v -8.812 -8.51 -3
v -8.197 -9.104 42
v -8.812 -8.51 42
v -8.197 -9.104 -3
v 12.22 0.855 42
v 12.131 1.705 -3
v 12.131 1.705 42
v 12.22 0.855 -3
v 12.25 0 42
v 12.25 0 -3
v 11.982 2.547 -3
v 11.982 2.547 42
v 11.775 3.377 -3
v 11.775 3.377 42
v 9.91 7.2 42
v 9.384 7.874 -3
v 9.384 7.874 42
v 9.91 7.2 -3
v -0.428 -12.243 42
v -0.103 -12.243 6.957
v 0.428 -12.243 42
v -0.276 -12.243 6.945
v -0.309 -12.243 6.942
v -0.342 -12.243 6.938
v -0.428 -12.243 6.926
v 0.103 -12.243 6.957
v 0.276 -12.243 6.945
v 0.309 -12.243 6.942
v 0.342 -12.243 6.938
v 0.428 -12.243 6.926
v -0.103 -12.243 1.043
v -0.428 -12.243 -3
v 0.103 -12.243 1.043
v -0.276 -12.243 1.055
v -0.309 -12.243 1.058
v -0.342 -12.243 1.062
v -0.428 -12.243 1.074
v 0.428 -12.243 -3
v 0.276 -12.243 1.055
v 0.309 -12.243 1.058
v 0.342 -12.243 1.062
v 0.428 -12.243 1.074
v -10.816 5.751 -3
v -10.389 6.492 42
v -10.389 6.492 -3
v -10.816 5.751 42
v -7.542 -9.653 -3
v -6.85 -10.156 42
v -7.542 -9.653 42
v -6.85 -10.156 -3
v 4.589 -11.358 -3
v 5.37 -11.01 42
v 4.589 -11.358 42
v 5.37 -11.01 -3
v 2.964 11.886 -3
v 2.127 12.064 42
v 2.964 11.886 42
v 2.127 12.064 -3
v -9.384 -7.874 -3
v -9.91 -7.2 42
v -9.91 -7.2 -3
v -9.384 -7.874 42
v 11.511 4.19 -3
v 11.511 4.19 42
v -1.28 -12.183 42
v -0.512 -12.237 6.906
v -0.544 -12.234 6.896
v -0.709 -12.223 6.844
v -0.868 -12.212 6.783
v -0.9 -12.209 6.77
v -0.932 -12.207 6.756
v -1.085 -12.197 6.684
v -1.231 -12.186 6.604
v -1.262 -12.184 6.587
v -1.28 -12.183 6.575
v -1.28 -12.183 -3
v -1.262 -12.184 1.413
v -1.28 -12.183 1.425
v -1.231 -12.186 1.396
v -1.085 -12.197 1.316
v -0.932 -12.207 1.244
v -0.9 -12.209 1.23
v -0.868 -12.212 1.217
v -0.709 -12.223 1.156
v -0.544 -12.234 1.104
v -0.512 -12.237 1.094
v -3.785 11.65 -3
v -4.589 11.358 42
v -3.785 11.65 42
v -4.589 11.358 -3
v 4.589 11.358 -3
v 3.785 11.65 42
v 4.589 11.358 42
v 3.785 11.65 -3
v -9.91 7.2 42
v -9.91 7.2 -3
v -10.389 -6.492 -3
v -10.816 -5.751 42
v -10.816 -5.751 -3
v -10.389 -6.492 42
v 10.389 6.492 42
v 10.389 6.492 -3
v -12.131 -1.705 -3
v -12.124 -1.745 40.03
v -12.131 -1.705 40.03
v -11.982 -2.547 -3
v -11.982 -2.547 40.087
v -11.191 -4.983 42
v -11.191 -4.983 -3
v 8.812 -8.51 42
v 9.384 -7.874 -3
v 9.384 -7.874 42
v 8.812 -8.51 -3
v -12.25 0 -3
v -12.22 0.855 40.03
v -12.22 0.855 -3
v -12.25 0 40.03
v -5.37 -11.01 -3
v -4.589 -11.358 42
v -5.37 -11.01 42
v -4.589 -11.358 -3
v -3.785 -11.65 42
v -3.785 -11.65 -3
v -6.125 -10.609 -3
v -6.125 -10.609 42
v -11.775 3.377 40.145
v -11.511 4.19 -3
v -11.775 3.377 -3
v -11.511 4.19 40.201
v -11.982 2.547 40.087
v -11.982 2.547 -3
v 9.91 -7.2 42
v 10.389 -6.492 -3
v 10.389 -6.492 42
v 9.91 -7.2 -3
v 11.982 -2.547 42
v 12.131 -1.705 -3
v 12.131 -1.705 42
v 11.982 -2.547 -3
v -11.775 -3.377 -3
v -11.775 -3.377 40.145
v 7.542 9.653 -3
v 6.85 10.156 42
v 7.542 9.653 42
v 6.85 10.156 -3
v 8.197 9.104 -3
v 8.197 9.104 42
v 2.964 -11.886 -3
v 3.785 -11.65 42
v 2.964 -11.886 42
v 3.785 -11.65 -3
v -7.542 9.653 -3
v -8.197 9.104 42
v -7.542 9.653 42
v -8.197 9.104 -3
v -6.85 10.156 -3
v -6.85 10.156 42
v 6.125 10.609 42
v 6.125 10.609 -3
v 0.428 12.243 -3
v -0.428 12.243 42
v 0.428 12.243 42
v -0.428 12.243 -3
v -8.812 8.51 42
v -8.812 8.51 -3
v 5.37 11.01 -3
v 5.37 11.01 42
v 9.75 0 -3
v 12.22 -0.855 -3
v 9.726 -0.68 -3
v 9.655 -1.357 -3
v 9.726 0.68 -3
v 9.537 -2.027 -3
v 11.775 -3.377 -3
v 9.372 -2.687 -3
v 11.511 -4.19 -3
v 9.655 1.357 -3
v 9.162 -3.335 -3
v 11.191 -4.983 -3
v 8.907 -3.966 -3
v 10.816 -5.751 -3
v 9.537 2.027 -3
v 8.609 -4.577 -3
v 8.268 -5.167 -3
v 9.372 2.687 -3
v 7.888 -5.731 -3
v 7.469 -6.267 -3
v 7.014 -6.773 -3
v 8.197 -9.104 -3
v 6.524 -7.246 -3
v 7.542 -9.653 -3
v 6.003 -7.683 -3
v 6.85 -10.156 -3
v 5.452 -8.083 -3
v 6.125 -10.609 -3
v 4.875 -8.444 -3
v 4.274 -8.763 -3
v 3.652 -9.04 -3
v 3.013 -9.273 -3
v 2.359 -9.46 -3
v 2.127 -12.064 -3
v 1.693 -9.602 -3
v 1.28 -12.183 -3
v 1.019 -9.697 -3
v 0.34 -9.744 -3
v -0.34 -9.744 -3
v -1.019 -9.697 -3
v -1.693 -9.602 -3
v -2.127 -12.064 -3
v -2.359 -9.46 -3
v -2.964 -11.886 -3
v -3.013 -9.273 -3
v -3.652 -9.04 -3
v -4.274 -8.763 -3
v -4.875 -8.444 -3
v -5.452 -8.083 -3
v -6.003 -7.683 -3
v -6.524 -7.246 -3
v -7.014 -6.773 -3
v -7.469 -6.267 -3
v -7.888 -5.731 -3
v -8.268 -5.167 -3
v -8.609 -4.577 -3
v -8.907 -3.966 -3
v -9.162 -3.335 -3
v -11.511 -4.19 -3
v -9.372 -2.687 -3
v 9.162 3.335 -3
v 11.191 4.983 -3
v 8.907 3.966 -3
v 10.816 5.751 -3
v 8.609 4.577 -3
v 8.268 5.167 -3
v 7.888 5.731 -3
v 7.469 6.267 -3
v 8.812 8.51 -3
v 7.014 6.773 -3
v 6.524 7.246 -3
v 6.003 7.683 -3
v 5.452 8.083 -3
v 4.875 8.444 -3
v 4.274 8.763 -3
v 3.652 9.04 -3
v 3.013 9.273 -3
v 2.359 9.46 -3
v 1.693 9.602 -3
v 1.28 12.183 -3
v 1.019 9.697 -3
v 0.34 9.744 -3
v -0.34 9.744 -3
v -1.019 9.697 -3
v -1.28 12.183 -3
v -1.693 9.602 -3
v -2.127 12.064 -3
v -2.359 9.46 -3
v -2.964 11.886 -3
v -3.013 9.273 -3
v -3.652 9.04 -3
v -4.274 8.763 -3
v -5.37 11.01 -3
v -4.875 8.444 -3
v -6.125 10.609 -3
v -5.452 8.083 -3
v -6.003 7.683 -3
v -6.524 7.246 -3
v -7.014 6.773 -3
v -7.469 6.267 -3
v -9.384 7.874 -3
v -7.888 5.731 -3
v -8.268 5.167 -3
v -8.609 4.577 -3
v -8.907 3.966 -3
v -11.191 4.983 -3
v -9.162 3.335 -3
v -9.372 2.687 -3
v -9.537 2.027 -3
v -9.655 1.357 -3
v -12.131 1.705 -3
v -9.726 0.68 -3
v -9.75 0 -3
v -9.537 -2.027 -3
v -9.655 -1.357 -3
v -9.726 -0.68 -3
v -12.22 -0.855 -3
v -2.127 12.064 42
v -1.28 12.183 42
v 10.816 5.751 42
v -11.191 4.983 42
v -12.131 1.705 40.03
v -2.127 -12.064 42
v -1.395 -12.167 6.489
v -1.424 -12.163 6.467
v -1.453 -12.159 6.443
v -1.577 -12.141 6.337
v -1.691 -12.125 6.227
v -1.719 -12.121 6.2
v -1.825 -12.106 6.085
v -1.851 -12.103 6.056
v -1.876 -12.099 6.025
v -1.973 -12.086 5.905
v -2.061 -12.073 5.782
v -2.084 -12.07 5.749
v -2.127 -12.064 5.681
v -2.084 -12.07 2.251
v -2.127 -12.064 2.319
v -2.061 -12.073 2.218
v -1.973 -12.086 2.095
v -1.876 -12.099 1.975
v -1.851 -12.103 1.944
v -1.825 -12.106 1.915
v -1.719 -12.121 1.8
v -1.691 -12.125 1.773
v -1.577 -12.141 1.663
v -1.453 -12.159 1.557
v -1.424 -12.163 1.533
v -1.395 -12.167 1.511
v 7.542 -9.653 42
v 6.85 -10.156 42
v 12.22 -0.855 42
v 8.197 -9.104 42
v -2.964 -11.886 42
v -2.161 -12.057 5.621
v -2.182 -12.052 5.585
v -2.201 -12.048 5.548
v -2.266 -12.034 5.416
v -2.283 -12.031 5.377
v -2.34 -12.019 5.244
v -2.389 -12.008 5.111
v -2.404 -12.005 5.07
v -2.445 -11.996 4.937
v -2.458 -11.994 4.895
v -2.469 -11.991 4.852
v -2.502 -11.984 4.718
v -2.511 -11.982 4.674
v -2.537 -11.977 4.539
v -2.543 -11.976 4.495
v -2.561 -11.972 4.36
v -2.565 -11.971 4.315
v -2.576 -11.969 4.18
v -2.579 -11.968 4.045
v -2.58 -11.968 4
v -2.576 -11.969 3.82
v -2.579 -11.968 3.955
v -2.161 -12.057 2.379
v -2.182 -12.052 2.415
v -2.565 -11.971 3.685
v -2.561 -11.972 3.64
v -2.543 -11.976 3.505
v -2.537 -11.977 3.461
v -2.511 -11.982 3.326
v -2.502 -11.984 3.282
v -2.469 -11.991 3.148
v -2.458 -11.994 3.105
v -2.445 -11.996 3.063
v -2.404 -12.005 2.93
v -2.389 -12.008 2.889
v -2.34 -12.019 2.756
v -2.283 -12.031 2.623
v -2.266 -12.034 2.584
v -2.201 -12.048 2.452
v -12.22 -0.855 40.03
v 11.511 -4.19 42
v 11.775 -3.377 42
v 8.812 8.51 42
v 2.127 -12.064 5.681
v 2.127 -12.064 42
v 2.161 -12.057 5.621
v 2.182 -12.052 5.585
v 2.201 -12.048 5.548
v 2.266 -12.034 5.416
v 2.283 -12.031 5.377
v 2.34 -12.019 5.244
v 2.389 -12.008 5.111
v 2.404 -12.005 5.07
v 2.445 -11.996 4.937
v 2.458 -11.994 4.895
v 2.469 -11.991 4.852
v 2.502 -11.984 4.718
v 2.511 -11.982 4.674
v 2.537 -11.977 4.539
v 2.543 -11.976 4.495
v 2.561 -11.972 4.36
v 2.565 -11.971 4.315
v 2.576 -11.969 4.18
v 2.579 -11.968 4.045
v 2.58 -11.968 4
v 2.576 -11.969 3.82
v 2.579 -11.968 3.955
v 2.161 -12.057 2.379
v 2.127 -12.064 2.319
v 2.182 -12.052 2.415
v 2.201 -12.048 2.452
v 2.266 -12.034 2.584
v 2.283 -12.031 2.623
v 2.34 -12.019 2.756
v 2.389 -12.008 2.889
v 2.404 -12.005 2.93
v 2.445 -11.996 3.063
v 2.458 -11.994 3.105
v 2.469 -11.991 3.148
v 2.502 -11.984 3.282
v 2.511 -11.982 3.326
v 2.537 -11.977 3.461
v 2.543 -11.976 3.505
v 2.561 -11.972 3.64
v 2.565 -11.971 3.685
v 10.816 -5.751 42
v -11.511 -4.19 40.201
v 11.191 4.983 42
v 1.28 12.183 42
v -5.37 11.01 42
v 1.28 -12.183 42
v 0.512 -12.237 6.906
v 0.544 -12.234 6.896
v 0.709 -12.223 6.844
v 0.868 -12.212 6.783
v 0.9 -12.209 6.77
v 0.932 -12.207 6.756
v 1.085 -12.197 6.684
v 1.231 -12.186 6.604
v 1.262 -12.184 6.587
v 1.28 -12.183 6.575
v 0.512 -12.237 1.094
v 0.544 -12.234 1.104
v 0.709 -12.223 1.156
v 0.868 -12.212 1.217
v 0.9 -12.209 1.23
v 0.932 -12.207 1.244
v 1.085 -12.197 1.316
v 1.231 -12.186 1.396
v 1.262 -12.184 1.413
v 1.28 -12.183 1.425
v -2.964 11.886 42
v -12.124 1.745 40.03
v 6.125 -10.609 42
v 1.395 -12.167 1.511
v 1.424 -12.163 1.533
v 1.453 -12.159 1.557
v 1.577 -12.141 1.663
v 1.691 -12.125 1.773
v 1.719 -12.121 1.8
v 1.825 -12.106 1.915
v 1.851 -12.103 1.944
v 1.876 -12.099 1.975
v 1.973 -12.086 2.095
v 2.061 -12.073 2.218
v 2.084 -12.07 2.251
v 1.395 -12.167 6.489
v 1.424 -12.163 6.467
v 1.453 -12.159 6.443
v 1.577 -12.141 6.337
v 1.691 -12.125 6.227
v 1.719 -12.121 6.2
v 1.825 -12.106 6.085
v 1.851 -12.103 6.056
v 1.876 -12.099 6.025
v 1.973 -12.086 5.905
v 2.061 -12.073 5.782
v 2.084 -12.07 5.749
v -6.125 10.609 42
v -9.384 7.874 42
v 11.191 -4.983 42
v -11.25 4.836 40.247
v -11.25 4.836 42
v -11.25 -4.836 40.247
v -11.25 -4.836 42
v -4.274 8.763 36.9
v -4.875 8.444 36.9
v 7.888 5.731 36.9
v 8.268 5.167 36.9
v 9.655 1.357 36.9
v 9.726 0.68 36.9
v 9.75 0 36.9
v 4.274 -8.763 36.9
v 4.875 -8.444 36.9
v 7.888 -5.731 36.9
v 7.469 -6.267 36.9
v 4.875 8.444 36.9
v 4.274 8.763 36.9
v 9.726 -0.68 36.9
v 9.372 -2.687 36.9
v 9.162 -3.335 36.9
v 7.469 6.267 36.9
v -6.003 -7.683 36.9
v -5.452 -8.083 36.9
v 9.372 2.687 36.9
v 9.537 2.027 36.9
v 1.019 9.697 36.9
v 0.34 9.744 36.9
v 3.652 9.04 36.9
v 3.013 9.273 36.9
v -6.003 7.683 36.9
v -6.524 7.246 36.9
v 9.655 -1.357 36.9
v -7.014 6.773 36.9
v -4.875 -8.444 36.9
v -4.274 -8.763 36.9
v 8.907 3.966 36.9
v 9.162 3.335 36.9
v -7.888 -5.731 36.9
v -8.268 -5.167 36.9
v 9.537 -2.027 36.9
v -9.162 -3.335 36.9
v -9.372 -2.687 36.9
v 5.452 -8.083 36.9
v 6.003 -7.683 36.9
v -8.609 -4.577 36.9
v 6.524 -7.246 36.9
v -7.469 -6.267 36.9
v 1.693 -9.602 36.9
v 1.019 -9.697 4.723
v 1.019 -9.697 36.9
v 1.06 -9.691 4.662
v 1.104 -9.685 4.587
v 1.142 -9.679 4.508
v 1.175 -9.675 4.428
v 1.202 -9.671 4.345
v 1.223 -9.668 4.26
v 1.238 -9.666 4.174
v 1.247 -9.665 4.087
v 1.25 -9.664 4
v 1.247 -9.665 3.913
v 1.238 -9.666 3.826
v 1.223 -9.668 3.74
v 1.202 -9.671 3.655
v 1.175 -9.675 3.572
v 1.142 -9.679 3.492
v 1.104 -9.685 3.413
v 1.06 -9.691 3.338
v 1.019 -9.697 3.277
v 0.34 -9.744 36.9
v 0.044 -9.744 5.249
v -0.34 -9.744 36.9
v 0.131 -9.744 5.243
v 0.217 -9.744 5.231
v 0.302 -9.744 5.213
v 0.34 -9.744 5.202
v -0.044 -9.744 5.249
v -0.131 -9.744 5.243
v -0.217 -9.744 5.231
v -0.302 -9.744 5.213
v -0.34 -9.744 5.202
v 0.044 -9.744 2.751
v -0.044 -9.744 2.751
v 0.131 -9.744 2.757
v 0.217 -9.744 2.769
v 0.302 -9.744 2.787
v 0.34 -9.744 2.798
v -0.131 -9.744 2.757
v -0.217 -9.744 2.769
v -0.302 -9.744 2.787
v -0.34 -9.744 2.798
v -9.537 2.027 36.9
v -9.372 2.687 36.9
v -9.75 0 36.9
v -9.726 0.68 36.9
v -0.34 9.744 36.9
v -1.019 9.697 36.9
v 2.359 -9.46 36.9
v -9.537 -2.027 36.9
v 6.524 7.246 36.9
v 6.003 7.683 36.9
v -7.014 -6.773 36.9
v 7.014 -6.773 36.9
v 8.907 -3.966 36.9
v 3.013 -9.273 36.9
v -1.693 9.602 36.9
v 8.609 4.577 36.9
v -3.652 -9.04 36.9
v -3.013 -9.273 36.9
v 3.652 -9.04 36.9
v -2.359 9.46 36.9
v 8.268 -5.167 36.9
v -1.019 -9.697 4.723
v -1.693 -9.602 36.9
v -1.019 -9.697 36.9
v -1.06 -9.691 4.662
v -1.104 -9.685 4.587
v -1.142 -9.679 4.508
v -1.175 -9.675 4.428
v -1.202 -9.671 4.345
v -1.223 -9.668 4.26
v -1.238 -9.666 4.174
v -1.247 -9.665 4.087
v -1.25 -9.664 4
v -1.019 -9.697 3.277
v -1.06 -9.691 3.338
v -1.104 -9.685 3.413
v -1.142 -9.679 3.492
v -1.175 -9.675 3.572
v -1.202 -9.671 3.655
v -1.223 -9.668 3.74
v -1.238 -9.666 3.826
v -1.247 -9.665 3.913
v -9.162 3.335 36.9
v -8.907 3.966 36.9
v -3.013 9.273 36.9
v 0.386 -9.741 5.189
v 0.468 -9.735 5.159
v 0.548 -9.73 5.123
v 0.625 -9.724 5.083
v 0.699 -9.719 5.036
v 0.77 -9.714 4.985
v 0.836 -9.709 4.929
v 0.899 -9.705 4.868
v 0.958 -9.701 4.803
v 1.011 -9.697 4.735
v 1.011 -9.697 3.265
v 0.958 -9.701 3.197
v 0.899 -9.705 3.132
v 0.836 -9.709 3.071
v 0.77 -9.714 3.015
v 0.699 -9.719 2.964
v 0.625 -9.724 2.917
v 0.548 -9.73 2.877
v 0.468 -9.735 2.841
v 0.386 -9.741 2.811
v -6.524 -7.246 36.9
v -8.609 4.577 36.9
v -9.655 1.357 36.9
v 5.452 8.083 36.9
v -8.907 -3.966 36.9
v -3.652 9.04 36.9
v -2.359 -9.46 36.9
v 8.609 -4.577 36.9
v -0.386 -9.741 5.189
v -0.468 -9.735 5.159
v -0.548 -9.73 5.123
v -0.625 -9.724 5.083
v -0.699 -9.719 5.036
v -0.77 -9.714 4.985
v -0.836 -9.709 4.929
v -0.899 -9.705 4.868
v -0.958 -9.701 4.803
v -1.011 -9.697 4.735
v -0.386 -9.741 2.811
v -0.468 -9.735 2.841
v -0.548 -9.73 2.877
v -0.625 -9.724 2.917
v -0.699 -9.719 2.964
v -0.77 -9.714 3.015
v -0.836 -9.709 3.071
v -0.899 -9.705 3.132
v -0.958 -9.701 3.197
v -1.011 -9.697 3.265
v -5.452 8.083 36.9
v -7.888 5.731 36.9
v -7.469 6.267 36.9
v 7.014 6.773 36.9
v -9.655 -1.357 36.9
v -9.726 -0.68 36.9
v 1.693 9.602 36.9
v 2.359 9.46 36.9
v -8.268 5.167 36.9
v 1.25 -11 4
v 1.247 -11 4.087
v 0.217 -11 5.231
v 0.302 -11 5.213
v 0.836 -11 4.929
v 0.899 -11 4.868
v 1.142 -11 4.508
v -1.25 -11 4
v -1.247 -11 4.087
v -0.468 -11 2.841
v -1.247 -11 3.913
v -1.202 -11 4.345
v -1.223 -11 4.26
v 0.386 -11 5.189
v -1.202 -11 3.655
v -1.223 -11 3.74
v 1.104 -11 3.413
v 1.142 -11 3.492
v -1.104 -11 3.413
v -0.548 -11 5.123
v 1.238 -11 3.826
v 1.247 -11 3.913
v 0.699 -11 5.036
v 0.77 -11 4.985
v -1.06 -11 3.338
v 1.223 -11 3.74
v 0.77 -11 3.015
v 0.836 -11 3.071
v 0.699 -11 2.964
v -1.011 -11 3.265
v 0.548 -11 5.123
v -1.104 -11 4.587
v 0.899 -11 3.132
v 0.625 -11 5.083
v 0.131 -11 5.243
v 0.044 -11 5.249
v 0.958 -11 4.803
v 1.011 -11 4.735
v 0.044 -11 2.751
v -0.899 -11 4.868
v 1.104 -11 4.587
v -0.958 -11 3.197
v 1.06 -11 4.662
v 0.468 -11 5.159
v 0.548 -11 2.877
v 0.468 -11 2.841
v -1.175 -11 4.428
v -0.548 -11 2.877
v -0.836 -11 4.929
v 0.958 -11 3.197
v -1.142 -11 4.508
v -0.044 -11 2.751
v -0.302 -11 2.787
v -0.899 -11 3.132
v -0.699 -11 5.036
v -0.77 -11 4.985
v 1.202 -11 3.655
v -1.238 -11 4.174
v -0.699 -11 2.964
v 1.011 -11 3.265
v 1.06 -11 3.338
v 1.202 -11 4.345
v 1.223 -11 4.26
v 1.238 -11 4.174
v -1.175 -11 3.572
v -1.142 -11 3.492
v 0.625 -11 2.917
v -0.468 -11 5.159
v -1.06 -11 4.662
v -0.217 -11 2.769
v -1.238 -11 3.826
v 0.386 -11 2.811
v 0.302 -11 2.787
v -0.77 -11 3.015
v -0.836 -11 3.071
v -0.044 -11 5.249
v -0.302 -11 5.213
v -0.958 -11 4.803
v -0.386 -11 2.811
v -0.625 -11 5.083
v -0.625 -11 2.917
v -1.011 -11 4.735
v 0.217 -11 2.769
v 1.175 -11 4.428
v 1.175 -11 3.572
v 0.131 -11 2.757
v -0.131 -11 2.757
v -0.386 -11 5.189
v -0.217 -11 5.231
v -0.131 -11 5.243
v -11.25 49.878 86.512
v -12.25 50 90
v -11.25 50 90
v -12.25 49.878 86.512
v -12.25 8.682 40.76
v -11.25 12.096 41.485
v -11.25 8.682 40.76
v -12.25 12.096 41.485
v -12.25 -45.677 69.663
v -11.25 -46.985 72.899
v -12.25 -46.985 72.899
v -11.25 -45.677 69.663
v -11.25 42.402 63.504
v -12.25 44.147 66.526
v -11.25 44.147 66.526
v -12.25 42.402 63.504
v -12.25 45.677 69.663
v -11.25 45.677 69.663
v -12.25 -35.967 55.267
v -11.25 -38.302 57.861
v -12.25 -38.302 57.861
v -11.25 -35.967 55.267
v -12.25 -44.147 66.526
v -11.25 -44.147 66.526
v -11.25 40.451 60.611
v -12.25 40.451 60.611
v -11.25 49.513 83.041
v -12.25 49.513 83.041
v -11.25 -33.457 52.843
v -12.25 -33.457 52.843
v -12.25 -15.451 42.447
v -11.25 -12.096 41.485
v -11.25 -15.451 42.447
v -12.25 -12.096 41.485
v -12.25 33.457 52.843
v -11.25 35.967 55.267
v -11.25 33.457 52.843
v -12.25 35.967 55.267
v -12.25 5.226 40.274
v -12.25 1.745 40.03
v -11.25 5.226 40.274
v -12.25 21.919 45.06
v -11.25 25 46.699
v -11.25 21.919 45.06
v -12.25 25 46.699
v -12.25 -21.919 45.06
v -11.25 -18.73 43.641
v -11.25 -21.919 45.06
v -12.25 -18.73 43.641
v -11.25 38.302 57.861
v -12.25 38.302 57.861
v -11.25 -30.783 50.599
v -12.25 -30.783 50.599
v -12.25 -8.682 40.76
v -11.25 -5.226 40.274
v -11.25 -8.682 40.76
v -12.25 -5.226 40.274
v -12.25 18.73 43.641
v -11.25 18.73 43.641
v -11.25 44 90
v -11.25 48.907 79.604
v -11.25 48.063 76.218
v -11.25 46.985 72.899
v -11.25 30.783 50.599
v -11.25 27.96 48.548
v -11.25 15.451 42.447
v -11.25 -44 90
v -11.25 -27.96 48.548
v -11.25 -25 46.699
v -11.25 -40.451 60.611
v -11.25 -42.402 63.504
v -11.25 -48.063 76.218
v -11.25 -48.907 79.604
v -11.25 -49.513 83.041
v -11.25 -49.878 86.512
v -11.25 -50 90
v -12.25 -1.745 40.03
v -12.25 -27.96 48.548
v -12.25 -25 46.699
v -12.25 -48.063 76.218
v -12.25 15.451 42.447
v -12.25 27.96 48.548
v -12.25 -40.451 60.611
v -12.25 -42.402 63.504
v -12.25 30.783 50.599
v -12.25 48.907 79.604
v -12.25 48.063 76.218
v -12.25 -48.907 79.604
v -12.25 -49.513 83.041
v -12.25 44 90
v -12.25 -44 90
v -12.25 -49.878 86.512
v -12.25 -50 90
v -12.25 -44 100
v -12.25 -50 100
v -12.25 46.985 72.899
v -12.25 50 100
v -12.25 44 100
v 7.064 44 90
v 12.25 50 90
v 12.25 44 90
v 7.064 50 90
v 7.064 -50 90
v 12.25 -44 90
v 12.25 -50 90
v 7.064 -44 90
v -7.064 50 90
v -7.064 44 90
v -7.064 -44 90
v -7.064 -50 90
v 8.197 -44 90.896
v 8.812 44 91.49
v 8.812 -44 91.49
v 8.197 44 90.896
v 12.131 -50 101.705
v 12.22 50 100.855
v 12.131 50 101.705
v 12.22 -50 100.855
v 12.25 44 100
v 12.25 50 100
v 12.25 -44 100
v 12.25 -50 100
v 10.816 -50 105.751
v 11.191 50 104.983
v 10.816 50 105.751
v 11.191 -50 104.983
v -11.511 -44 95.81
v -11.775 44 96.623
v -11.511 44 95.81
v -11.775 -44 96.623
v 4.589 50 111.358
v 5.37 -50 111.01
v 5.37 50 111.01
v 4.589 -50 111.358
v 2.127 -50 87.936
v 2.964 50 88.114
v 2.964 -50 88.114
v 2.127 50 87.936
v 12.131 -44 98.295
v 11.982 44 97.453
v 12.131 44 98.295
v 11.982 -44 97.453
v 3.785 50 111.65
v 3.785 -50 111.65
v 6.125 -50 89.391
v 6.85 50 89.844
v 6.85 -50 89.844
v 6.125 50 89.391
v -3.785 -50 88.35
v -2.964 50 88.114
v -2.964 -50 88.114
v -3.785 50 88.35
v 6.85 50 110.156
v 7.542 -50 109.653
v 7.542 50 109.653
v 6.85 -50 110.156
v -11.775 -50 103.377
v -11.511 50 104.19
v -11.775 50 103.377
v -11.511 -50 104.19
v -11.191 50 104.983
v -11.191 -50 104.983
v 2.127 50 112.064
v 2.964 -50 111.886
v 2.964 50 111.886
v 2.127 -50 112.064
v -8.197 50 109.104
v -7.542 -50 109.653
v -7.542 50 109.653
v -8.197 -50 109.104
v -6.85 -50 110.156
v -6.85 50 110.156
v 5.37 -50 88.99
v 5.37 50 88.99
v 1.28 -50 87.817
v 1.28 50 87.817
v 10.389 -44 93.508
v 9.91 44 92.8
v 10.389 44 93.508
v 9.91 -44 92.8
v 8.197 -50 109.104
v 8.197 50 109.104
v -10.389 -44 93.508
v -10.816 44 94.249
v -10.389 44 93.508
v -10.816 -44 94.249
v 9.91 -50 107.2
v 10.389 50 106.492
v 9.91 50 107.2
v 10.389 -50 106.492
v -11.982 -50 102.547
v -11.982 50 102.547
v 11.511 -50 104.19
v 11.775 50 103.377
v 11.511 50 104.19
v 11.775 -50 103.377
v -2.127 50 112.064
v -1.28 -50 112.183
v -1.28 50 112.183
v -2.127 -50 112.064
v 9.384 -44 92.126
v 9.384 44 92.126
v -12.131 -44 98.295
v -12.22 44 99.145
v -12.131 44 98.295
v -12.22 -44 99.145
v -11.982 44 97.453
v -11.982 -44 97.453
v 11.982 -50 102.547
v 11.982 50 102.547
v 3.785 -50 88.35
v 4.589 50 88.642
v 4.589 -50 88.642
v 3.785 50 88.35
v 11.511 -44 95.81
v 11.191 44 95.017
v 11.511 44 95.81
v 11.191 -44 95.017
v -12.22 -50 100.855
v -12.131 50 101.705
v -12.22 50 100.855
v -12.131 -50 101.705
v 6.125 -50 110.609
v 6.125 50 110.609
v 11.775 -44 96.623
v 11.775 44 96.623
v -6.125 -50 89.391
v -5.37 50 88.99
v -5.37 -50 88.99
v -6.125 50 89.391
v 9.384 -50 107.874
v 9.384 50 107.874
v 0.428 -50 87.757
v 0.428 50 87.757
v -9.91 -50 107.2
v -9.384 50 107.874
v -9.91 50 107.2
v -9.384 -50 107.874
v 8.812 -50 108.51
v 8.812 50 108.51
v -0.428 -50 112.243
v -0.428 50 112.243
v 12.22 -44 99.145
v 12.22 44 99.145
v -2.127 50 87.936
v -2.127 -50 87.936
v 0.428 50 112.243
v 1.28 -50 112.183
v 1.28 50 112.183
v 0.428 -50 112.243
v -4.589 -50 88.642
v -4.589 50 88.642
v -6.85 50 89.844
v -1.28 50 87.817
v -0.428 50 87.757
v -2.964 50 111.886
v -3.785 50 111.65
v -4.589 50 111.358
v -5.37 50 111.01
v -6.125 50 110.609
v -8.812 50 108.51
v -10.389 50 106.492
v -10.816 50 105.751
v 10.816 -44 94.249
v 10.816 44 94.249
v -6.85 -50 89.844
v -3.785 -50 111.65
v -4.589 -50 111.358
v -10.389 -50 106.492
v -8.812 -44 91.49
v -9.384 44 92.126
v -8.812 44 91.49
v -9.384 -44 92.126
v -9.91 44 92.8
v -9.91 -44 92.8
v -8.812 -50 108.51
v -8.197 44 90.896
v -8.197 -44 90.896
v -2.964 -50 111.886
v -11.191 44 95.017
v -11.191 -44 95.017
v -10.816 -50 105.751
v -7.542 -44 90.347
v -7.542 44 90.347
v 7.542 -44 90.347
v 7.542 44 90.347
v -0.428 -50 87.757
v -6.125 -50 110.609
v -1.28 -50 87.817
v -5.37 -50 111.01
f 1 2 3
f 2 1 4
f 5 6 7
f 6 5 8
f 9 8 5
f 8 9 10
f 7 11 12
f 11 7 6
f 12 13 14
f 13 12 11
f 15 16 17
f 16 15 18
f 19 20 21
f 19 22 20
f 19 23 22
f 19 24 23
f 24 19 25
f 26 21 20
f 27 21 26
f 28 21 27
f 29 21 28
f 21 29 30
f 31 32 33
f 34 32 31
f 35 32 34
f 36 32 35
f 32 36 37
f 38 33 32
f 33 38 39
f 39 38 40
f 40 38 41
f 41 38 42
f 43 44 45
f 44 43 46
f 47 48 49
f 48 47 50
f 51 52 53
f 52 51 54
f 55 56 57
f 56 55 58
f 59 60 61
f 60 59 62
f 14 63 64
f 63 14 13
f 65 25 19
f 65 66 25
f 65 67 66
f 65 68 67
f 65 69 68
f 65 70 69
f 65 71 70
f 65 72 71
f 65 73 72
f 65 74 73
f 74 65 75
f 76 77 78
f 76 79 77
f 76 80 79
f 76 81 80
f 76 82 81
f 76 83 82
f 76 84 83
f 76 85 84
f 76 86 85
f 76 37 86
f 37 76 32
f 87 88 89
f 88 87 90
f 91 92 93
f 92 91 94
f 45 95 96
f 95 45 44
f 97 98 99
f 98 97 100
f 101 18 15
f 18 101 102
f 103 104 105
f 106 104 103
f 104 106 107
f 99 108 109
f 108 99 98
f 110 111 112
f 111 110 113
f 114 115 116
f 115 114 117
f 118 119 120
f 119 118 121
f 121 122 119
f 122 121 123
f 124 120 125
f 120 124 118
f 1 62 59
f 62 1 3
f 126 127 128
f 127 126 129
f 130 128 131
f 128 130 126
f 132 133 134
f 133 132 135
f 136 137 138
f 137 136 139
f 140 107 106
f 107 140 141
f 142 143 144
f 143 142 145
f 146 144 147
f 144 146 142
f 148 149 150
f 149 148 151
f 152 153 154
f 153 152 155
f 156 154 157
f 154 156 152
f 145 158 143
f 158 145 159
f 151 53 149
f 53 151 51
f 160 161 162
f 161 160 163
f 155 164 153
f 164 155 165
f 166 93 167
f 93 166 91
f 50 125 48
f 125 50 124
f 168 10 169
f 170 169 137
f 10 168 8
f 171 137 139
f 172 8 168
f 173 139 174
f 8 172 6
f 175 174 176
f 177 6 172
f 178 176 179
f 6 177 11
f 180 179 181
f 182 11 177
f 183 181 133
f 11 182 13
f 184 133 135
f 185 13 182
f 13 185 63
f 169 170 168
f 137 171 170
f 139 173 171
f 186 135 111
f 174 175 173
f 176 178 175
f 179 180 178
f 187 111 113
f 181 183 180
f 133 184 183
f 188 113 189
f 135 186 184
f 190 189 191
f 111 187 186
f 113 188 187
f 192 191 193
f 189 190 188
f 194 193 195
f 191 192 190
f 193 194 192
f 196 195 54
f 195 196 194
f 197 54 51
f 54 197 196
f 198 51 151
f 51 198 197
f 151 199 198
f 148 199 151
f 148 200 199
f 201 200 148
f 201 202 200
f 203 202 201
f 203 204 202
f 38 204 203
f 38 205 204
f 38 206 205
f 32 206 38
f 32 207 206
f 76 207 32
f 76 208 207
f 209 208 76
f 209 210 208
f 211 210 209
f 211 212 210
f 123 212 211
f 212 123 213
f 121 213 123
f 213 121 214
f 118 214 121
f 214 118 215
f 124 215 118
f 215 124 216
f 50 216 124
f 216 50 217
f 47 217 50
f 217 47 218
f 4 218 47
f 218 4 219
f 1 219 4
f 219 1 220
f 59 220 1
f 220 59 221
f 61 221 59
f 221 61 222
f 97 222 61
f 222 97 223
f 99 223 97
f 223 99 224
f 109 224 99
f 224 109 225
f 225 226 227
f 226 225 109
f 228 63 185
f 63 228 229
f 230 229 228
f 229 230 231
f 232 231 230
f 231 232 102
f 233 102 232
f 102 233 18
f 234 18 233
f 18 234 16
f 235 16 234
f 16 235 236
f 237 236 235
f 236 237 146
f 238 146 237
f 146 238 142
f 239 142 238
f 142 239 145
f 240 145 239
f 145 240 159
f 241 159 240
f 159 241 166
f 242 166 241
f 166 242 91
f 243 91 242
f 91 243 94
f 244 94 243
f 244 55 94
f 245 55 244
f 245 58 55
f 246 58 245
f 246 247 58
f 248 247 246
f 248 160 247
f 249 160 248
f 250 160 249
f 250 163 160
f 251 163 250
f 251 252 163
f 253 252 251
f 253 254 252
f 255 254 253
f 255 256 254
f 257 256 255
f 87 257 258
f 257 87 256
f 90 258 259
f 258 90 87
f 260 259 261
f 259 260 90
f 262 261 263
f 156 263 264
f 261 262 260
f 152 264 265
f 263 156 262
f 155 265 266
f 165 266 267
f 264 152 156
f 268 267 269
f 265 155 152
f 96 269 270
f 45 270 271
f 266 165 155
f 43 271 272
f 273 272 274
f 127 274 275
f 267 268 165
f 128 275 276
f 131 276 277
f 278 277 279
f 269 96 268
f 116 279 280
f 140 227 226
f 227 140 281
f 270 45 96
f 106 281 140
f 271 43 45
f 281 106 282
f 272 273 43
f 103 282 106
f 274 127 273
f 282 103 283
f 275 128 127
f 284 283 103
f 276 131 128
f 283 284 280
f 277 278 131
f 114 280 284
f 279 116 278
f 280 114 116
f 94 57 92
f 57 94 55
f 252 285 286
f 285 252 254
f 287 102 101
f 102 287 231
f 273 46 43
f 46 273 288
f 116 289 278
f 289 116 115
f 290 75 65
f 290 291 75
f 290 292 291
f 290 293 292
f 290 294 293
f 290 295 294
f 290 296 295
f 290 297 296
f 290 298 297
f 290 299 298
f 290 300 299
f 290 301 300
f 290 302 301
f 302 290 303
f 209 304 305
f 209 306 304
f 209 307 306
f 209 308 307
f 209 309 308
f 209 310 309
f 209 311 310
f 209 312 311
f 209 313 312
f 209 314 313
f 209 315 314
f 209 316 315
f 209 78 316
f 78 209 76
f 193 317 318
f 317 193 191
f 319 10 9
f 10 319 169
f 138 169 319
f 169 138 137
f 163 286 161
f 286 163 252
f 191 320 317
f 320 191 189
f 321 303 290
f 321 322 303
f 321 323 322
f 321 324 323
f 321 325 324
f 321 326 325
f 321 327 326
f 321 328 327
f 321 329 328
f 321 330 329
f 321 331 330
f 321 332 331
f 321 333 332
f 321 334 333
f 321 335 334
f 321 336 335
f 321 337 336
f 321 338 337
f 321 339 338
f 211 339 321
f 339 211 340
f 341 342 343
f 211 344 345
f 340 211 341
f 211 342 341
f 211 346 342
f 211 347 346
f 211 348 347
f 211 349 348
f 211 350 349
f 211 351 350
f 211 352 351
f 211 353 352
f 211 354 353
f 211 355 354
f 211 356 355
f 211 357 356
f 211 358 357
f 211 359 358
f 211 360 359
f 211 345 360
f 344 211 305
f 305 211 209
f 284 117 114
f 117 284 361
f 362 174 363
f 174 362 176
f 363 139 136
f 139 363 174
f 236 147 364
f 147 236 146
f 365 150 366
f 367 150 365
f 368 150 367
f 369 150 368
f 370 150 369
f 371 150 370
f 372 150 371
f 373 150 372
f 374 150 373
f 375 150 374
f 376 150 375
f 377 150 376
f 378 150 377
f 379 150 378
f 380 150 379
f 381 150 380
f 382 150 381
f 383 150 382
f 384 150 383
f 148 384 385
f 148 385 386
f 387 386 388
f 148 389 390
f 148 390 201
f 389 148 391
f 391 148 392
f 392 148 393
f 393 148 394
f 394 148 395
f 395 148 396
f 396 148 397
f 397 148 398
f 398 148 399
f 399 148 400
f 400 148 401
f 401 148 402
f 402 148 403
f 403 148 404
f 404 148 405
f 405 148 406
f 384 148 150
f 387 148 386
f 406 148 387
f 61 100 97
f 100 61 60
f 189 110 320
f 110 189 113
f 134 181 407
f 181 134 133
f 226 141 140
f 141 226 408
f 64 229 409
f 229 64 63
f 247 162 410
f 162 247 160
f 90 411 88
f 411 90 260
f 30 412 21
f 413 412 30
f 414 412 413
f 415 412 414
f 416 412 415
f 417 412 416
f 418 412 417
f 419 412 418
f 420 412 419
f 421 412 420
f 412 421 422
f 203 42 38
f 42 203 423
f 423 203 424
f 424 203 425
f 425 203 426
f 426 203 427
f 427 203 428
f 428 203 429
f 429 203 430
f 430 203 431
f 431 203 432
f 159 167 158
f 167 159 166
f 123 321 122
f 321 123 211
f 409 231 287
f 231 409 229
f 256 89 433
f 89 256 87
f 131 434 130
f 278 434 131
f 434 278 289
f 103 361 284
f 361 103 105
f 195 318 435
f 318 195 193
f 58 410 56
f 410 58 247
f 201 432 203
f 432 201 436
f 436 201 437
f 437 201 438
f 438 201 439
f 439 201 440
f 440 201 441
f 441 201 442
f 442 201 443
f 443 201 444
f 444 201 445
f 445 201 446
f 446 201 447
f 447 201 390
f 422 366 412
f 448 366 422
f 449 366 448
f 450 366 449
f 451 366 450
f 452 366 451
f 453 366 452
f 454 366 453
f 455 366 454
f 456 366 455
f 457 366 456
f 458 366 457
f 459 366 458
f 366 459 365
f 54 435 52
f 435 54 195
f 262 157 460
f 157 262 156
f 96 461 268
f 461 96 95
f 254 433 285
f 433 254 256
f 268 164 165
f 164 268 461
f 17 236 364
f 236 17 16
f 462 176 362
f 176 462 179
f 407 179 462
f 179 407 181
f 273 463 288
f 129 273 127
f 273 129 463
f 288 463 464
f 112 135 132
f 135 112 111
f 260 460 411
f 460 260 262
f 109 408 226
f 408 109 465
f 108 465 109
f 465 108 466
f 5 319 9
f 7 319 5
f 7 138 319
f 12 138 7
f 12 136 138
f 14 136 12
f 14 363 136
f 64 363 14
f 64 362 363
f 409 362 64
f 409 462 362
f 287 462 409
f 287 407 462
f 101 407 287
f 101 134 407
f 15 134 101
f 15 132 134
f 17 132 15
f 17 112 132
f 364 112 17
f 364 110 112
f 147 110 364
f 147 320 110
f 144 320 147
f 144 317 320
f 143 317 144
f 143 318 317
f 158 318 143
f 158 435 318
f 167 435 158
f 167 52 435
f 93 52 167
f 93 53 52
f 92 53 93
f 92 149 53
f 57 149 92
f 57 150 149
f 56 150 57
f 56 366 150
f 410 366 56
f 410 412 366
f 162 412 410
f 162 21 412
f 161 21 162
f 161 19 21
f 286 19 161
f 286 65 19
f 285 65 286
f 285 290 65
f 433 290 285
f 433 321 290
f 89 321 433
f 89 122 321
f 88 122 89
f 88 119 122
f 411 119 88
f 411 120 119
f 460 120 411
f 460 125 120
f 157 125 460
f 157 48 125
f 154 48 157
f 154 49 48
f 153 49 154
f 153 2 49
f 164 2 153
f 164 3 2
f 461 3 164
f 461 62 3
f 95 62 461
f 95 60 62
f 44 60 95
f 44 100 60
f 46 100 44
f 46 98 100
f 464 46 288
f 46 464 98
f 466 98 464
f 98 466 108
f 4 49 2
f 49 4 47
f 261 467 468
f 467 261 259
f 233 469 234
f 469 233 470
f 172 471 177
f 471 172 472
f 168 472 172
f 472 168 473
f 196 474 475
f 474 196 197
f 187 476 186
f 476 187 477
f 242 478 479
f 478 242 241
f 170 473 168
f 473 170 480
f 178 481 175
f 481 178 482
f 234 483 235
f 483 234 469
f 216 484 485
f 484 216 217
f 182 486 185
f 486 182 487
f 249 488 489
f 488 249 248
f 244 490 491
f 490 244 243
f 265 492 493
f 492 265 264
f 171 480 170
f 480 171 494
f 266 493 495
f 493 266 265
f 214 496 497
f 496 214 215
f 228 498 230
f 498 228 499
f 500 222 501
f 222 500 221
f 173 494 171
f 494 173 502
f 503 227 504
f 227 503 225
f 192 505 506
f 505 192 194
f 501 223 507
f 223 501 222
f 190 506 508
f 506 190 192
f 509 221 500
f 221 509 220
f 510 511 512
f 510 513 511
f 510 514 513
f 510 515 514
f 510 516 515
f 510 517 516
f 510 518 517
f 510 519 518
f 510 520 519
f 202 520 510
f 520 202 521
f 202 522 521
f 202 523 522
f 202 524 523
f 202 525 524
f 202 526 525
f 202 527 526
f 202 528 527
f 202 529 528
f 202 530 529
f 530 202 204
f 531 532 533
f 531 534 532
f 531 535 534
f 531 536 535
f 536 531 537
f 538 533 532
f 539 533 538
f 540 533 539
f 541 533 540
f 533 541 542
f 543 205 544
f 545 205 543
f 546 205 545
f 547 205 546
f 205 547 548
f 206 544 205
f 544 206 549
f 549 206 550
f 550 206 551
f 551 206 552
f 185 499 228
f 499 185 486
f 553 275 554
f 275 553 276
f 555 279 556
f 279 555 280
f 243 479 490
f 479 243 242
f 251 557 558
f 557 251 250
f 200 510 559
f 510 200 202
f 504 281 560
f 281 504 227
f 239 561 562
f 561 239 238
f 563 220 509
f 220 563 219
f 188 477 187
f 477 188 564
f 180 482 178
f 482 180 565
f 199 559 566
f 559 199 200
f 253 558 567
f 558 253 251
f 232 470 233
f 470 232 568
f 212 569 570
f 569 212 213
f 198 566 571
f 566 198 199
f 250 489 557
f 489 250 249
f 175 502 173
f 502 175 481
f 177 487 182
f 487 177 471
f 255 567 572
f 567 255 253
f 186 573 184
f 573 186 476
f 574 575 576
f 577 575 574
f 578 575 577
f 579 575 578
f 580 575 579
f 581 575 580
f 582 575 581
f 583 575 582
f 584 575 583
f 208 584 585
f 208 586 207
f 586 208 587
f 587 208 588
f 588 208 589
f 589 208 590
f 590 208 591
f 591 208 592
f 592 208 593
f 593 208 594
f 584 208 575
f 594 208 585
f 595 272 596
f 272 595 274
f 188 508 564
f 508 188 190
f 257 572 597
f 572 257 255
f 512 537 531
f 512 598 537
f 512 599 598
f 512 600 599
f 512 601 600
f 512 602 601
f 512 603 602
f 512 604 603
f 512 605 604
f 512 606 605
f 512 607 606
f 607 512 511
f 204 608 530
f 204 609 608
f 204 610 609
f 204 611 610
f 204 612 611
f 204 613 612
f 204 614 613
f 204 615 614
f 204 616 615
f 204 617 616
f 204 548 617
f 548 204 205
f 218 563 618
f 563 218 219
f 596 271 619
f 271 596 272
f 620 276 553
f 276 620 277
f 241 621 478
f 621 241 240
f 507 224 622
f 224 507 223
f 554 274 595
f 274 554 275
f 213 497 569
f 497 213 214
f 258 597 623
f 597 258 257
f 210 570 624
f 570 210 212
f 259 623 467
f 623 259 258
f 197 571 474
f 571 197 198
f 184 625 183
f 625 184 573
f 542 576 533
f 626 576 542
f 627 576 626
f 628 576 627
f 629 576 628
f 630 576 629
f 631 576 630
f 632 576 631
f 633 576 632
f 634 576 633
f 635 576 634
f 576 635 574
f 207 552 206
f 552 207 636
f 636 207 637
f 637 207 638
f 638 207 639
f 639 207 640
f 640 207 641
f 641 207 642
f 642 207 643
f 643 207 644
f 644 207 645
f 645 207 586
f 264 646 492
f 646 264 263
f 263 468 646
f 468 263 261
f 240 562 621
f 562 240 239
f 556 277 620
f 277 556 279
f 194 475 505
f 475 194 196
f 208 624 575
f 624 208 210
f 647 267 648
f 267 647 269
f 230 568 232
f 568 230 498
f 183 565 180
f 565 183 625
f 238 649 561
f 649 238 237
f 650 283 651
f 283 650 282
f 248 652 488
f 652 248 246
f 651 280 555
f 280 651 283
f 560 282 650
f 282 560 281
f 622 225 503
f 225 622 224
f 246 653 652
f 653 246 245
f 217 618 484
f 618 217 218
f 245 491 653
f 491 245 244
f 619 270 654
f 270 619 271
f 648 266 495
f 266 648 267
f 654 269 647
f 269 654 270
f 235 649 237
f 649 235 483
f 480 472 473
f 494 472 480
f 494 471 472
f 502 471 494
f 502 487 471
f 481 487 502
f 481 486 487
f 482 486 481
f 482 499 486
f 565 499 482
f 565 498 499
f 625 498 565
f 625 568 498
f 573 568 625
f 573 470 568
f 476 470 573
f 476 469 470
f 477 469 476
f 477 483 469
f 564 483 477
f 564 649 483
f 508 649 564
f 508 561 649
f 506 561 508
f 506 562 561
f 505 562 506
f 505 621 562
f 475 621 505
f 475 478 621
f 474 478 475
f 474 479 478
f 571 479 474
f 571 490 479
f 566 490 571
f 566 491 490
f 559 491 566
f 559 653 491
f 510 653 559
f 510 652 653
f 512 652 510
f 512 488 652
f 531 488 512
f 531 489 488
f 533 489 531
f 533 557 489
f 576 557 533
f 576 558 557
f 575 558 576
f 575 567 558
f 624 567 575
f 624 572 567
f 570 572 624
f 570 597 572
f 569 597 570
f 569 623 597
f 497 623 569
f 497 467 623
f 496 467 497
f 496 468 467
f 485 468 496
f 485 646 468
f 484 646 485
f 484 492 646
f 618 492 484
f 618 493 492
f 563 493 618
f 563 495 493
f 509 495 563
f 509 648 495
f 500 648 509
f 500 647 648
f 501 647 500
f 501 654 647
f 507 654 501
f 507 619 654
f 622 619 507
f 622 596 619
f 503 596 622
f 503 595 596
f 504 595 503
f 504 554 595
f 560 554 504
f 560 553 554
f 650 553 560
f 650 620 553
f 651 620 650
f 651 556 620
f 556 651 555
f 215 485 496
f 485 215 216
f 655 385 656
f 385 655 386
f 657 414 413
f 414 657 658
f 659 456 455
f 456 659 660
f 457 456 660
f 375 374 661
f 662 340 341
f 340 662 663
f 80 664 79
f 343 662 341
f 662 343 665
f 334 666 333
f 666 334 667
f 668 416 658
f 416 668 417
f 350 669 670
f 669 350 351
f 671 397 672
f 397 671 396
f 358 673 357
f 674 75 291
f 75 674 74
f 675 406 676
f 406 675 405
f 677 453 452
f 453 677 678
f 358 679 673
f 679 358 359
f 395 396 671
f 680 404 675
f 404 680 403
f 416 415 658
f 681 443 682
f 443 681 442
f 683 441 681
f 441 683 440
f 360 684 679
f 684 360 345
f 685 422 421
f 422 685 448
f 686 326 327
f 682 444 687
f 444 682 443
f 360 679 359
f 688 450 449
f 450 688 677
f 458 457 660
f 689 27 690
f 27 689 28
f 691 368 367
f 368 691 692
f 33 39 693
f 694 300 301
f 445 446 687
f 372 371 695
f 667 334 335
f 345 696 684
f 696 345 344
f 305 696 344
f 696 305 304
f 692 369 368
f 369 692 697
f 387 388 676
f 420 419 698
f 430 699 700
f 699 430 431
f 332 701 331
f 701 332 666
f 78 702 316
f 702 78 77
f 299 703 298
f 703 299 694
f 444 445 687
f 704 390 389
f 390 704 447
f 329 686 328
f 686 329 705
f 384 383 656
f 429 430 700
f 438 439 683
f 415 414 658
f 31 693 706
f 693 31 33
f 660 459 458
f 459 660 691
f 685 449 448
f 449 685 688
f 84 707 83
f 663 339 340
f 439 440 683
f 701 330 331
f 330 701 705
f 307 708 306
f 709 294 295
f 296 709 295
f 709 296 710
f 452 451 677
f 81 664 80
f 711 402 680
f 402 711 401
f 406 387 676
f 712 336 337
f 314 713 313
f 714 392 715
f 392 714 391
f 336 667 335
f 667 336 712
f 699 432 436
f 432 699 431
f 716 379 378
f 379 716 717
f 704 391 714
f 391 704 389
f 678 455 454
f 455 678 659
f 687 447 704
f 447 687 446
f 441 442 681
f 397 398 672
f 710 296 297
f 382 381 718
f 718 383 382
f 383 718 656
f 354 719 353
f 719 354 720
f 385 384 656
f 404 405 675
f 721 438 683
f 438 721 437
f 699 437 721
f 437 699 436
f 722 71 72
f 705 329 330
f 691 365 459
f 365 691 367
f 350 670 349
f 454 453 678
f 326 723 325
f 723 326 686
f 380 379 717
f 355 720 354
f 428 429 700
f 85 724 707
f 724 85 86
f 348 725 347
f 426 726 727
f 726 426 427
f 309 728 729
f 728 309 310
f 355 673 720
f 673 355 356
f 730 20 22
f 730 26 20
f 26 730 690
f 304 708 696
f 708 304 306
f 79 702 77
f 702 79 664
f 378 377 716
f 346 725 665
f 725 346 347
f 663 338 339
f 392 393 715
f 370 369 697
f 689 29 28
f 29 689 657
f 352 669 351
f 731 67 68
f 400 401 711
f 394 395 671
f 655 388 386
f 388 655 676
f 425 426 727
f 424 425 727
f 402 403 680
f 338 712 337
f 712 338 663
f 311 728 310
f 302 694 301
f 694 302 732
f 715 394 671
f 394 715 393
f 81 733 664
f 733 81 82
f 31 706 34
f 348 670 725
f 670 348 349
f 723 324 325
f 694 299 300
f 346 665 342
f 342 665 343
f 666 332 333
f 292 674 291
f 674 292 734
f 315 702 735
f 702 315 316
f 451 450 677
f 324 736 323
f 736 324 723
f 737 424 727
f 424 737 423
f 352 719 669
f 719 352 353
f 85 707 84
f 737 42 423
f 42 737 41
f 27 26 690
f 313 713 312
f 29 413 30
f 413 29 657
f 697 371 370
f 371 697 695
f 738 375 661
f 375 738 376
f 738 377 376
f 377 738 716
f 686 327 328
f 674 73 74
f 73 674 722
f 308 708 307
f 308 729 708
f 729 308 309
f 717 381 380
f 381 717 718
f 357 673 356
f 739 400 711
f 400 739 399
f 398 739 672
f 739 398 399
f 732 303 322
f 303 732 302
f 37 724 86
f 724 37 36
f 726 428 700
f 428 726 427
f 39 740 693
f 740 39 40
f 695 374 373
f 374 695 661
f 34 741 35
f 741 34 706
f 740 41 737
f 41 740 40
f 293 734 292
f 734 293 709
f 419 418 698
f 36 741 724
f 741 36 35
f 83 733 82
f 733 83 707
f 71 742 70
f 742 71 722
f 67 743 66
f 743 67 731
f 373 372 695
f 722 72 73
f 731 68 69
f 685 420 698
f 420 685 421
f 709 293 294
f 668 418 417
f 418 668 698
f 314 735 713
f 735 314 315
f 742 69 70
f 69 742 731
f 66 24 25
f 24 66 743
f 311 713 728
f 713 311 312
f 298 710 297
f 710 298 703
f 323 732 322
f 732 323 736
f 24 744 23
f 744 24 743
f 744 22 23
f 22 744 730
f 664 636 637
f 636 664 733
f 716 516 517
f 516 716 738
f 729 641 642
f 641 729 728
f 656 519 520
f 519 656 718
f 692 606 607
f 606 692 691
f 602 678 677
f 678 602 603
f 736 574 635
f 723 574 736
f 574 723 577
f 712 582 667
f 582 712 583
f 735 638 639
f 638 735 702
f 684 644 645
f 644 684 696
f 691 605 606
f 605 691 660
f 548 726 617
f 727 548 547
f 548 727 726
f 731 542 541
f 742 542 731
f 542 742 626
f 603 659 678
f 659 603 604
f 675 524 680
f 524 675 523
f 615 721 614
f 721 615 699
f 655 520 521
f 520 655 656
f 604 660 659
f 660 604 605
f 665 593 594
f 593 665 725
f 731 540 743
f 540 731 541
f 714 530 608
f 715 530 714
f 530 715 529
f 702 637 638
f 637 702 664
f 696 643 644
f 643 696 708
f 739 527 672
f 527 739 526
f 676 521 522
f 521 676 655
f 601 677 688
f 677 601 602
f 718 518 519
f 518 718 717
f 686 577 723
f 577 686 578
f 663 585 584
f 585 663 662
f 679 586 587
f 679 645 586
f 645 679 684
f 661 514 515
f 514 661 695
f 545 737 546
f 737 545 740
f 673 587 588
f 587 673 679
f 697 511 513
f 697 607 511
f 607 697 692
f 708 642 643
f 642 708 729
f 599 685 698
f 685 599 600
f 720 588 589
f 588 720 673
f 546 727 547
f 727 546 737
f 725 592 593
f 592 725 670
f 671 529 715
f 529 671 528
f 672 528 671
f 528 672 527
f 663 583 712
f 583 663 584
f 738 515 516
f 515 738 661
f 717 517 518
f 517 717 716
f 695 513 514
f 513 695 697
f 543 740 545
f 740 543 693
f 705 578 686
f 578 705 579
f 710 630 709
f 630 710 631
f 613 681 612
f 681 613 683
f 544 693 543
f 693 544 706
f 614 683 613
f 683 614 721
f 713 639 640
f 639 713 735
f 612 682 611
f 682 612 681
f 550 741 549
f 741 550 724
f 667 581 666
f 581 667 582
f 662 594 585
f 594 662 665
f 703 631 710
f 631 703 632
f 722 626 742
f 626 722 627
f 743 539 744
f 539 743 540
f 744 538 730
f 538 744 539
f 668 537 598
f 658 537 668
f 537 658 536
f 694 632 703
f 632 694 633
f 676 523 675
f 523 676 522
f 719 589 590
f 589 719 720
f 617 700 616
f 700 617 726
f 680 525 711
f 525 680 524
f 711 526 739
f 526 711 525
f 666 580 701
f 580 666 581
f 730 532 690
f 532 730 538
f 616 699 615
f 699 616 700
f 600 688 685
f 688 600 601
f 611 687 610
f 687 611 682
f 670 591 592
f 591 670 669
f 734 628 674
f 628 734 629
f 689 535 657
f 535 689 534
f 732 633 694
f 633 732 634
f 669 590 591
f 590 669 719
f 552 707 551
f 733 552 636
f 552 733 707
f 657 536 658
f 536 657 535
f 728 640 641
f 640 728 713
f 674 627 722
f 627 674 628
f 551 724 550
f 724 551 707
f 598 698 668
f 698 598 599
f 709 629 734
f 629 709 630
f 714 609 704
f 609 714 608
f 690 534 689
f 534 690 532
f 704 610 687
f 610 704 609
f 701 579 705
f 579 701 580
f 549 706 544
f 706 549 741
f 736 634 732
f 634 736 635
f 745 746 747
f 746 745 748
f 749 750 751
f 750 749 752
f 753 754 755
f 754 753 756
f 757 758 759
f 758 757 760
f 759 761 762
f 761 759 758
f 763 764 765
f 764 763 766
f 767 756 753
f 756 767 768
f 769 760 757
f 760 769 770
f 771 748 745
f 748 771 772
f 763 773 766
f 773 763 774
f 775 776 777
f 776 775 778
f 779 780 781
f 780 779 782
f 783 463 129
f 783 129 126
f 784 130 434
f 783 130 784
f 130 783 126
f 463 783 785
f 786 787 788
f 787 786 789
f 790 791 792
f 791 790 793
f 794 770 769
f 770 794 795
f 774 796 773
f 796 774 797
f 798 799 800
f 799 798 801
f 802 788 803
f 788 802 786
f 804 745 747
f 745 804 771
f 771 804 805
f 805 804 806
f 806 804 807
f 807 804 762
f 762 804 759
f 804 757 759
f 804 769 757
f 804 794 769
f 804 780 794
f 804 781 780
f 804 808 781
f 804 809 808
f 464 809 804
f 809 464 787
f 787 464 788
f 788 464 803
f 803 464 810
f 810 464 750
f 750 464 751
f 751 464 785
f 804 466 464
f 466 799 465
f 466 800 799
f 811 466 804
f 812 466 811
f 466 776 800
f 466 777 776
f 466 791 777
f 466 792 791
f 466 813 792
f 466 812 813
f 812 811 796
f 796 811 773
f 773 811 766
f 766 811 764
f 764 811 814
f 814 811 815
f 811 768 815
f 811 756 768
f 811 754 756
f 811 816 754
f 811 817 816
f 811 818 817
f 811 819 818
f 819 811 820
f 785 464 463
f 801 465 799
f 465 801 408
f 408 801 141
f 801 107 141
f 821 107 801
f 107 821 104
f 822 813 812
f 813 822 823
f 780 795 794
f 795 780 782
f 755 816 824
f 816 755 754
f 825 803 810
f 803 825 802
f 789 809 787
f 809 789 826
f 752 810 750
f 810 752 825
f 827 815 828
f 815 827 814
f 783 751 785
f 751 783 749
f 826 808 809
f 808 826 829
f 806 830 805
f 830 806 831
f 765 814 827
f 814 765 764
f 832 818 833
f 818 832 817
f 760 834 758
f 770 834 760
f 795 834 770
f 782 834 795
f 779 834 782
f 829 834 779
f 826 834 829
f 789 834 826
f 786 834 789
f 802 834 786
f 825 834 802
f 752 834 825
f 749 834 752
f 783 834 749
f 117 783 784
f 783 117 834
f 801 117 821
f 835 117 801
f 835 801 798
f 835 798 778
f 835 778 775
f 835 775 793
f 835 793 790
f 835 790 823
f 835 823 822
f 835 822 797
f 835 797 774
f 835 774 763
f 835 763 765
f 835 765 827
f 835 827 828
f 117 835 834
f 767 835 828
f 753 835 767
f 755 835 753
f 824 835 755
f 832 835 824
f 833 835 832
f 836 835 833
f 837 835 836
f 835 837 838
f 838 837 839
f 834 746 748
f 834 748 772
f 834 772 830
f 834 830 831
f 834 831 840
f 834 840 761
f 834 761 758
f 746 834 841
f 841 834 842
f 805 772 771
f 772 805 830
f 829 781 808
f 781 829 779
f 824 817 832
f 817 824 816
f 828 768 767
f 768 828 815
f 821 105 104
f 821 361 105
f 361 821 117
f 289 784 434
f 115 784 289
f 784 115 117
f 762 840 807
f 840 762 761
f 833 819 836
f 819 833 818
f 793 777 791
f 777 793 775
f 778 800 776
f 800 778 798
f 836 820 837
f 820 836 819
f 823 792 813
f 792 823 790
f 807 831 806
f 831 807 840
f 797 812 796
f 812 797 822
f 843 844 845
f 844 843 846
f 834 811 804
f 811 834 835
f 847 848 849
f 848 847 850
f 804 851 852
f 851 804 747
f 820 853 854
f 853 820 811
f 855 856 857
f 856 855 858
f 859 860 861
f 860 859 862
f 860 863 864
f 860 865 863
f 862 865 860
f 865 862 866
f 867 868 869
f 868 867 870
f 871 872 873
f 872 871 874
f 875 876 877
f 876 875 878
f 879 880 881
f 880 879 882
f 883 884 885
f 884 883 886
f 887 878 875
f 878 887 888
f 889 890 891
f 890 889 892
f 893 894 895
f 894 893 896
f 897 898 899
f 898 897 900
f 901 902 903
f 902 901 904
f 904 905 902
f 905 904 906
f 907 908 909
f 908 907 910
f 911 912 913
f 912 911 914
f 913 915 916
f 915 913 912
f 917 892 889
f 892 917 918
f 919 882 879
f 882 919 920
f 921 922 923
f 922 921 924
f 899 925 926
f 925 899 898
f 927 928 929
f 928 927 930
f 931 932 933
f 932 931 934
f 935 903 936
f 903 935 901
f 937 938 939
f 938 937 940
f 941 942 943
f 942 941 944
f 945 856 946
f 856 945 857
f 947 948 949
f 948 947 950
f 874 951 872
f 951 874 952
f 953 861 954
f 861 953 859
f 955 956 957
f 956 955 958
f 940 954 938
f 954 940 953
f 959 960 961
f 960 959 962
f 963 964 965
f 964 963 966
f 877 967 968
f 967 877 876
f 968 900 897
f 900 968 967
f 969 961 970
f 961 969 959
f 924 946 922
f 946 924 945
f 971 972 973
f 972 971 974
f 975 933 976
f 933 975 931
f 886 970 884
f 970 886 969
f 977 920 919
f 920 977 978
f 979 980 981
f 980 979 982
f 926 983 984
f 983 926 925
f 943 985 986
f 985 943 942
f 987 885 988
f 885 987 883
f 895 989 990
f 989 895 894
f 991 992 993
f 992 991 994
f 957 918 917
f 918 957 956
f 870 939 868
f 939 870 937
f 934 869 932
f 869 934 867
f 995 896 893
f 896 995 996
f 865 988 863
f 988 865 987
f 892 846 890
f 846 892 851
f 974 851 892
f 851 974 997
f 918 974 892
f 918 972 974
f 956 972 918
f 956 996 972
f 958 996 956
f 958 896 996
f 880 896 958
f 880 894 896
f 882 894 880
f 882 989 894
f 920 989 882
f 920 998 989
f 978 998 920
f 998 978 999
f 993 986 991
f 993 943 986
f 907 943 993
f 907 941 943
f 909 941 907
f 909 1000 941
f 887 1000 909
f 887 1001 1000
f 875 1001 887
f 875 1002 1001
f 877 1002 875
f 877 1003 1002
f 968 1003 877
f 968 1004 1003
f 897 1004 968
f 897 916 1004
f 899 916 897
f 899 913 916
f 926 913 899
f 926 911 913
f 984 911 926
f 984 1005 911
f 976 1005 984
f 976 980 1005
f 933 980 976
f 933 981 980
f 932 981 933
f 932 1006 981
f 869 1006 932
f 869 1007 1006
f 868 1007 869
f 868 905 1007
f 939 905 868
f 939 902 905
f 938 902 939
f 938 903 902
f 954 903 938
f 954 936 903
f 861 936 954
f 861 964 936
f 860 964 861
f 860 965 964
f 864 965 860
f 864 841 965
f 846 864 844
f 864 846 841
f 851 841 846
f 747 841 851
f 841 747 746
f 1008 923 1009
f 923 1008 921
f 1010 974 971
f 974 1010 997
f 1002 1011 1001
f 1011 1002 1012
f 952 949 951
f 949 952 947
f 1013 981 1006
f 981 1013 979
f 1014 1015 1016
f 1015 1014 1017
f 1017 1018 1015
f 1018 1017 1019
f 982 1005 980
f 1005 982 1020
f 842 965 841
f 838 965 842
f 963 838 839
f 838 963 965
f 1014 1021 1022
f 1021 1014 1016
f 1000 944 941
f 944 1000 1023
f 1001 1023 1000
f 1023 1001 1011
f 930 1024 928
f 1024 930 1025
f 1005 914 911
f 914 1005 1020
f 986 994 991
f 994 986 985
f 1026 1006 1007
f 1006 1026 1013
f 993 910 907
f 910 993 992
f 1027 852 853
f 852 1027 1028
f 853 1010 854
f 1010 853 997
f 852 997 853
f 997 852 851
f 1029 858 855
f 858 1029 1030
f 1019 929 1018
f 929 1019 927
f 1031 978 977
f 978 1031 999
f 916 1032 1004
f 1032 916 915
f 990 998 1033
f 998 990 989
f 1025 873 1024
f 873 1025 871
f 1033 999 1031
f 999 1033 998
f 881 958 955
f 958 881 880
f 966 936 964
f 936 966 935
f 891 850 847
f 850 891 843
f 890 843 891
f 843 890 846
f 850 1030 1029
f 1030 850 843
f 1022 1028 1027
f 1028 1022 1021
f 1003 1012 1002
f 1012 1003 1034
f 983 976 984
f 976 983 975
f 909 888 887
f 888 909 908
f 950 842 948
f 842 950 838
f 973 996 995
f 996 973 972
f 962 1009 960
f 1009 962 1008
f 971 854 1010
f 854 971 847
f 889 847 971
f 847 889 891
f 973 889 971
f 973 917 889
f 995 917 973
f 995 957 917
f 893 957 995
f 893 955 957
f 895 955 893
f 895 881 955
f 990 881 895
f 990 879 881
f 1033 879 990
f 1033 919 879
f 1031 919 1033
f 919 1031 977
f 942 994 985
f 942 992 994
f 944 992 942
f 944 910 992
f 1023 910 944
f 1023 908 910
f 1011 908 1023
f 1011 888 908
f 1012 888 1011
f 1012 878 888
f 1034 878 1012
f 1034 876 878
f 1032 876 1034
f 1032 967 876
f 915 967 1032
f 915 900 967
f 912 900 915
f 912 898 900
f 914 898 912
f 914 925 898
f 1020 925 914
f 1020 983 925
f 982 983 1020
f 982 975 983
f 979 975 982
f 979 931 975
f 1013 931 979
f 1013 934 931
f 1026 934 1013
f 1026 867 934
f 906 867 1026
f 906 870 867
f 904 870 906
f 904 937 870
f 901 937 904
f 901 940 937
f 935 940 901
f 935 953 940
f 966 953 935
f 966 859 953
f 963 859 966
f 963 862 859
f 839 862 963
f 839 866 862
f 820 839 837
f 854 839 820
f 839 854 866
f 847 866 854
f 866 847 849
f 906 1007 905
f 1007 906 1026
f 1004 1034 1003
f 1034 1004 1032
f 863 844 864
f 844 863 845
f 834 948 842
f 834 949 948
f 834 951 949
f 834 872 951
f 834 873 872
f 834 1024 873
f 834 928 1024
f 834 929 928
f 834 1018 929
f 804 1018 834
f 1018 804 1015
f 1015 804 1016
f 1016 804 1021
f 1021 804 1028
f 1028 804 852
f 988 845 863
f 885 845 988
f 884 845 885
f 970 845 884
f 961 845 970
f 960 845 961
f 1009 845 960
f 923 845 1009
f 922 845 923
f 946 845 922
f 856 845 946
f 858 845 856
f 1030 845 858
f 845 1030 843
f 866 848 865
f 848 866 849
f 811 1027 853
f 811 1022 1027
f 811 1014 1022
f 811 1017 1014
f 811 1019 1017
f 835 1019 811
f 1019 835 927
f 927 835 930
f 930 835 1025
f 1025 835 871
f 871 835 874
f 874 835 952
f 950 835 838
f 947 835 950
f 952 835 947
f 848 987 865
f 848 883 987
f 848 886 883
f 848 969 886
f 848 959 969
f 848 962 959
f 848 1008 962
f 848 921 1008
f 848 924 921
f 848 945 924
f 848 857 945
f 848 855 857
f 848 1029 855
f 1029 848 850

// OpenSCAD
$fn = 90;

d = 19.5;
wall_thickness = 2.5;

mount();
handle();

module mount() {
    translate([0, 0, -3]) difference() {
        cylinder(d = d + 2 * wall_thickness, h = 40 + 5);
        translate([0, 0, -0.1]) cylinder(d = d, h = 40);
        
        translate([0, -11, 7]) rotate([90, 0, 0]) cylinder(d1 = 2.5, d2 = 8, h = 2);
        translate([0, -9.1, 7]) rotate([90, 0, 0]) cylinder(d = 2.5, h = 2);
    }
}

module handle() {
    translate([0, 50, 100]) rotate([90, 0, 0]) cylinder(d = d + 2 * wall_thickness, h = 100);
    translate([-12.25, 44, 90]) cube([d + 2 * wall_thickness, 6, 10]);
    translate([-12.25, -50, 90]) cube([d + 2 * wall_thickness, 6, 10]);
    
    translate([-12.25, 0, 90]) rotate([90, 0, 90]) difference() {
        cylinder(d = 100, h = d + 2 * wall_thickness, true);
        translate([0, 0, -2]) cylinder(d = 88, h = 30, true);
        translate([-60, 0, -2]) cube([120, 80, 30]);
    }
}
